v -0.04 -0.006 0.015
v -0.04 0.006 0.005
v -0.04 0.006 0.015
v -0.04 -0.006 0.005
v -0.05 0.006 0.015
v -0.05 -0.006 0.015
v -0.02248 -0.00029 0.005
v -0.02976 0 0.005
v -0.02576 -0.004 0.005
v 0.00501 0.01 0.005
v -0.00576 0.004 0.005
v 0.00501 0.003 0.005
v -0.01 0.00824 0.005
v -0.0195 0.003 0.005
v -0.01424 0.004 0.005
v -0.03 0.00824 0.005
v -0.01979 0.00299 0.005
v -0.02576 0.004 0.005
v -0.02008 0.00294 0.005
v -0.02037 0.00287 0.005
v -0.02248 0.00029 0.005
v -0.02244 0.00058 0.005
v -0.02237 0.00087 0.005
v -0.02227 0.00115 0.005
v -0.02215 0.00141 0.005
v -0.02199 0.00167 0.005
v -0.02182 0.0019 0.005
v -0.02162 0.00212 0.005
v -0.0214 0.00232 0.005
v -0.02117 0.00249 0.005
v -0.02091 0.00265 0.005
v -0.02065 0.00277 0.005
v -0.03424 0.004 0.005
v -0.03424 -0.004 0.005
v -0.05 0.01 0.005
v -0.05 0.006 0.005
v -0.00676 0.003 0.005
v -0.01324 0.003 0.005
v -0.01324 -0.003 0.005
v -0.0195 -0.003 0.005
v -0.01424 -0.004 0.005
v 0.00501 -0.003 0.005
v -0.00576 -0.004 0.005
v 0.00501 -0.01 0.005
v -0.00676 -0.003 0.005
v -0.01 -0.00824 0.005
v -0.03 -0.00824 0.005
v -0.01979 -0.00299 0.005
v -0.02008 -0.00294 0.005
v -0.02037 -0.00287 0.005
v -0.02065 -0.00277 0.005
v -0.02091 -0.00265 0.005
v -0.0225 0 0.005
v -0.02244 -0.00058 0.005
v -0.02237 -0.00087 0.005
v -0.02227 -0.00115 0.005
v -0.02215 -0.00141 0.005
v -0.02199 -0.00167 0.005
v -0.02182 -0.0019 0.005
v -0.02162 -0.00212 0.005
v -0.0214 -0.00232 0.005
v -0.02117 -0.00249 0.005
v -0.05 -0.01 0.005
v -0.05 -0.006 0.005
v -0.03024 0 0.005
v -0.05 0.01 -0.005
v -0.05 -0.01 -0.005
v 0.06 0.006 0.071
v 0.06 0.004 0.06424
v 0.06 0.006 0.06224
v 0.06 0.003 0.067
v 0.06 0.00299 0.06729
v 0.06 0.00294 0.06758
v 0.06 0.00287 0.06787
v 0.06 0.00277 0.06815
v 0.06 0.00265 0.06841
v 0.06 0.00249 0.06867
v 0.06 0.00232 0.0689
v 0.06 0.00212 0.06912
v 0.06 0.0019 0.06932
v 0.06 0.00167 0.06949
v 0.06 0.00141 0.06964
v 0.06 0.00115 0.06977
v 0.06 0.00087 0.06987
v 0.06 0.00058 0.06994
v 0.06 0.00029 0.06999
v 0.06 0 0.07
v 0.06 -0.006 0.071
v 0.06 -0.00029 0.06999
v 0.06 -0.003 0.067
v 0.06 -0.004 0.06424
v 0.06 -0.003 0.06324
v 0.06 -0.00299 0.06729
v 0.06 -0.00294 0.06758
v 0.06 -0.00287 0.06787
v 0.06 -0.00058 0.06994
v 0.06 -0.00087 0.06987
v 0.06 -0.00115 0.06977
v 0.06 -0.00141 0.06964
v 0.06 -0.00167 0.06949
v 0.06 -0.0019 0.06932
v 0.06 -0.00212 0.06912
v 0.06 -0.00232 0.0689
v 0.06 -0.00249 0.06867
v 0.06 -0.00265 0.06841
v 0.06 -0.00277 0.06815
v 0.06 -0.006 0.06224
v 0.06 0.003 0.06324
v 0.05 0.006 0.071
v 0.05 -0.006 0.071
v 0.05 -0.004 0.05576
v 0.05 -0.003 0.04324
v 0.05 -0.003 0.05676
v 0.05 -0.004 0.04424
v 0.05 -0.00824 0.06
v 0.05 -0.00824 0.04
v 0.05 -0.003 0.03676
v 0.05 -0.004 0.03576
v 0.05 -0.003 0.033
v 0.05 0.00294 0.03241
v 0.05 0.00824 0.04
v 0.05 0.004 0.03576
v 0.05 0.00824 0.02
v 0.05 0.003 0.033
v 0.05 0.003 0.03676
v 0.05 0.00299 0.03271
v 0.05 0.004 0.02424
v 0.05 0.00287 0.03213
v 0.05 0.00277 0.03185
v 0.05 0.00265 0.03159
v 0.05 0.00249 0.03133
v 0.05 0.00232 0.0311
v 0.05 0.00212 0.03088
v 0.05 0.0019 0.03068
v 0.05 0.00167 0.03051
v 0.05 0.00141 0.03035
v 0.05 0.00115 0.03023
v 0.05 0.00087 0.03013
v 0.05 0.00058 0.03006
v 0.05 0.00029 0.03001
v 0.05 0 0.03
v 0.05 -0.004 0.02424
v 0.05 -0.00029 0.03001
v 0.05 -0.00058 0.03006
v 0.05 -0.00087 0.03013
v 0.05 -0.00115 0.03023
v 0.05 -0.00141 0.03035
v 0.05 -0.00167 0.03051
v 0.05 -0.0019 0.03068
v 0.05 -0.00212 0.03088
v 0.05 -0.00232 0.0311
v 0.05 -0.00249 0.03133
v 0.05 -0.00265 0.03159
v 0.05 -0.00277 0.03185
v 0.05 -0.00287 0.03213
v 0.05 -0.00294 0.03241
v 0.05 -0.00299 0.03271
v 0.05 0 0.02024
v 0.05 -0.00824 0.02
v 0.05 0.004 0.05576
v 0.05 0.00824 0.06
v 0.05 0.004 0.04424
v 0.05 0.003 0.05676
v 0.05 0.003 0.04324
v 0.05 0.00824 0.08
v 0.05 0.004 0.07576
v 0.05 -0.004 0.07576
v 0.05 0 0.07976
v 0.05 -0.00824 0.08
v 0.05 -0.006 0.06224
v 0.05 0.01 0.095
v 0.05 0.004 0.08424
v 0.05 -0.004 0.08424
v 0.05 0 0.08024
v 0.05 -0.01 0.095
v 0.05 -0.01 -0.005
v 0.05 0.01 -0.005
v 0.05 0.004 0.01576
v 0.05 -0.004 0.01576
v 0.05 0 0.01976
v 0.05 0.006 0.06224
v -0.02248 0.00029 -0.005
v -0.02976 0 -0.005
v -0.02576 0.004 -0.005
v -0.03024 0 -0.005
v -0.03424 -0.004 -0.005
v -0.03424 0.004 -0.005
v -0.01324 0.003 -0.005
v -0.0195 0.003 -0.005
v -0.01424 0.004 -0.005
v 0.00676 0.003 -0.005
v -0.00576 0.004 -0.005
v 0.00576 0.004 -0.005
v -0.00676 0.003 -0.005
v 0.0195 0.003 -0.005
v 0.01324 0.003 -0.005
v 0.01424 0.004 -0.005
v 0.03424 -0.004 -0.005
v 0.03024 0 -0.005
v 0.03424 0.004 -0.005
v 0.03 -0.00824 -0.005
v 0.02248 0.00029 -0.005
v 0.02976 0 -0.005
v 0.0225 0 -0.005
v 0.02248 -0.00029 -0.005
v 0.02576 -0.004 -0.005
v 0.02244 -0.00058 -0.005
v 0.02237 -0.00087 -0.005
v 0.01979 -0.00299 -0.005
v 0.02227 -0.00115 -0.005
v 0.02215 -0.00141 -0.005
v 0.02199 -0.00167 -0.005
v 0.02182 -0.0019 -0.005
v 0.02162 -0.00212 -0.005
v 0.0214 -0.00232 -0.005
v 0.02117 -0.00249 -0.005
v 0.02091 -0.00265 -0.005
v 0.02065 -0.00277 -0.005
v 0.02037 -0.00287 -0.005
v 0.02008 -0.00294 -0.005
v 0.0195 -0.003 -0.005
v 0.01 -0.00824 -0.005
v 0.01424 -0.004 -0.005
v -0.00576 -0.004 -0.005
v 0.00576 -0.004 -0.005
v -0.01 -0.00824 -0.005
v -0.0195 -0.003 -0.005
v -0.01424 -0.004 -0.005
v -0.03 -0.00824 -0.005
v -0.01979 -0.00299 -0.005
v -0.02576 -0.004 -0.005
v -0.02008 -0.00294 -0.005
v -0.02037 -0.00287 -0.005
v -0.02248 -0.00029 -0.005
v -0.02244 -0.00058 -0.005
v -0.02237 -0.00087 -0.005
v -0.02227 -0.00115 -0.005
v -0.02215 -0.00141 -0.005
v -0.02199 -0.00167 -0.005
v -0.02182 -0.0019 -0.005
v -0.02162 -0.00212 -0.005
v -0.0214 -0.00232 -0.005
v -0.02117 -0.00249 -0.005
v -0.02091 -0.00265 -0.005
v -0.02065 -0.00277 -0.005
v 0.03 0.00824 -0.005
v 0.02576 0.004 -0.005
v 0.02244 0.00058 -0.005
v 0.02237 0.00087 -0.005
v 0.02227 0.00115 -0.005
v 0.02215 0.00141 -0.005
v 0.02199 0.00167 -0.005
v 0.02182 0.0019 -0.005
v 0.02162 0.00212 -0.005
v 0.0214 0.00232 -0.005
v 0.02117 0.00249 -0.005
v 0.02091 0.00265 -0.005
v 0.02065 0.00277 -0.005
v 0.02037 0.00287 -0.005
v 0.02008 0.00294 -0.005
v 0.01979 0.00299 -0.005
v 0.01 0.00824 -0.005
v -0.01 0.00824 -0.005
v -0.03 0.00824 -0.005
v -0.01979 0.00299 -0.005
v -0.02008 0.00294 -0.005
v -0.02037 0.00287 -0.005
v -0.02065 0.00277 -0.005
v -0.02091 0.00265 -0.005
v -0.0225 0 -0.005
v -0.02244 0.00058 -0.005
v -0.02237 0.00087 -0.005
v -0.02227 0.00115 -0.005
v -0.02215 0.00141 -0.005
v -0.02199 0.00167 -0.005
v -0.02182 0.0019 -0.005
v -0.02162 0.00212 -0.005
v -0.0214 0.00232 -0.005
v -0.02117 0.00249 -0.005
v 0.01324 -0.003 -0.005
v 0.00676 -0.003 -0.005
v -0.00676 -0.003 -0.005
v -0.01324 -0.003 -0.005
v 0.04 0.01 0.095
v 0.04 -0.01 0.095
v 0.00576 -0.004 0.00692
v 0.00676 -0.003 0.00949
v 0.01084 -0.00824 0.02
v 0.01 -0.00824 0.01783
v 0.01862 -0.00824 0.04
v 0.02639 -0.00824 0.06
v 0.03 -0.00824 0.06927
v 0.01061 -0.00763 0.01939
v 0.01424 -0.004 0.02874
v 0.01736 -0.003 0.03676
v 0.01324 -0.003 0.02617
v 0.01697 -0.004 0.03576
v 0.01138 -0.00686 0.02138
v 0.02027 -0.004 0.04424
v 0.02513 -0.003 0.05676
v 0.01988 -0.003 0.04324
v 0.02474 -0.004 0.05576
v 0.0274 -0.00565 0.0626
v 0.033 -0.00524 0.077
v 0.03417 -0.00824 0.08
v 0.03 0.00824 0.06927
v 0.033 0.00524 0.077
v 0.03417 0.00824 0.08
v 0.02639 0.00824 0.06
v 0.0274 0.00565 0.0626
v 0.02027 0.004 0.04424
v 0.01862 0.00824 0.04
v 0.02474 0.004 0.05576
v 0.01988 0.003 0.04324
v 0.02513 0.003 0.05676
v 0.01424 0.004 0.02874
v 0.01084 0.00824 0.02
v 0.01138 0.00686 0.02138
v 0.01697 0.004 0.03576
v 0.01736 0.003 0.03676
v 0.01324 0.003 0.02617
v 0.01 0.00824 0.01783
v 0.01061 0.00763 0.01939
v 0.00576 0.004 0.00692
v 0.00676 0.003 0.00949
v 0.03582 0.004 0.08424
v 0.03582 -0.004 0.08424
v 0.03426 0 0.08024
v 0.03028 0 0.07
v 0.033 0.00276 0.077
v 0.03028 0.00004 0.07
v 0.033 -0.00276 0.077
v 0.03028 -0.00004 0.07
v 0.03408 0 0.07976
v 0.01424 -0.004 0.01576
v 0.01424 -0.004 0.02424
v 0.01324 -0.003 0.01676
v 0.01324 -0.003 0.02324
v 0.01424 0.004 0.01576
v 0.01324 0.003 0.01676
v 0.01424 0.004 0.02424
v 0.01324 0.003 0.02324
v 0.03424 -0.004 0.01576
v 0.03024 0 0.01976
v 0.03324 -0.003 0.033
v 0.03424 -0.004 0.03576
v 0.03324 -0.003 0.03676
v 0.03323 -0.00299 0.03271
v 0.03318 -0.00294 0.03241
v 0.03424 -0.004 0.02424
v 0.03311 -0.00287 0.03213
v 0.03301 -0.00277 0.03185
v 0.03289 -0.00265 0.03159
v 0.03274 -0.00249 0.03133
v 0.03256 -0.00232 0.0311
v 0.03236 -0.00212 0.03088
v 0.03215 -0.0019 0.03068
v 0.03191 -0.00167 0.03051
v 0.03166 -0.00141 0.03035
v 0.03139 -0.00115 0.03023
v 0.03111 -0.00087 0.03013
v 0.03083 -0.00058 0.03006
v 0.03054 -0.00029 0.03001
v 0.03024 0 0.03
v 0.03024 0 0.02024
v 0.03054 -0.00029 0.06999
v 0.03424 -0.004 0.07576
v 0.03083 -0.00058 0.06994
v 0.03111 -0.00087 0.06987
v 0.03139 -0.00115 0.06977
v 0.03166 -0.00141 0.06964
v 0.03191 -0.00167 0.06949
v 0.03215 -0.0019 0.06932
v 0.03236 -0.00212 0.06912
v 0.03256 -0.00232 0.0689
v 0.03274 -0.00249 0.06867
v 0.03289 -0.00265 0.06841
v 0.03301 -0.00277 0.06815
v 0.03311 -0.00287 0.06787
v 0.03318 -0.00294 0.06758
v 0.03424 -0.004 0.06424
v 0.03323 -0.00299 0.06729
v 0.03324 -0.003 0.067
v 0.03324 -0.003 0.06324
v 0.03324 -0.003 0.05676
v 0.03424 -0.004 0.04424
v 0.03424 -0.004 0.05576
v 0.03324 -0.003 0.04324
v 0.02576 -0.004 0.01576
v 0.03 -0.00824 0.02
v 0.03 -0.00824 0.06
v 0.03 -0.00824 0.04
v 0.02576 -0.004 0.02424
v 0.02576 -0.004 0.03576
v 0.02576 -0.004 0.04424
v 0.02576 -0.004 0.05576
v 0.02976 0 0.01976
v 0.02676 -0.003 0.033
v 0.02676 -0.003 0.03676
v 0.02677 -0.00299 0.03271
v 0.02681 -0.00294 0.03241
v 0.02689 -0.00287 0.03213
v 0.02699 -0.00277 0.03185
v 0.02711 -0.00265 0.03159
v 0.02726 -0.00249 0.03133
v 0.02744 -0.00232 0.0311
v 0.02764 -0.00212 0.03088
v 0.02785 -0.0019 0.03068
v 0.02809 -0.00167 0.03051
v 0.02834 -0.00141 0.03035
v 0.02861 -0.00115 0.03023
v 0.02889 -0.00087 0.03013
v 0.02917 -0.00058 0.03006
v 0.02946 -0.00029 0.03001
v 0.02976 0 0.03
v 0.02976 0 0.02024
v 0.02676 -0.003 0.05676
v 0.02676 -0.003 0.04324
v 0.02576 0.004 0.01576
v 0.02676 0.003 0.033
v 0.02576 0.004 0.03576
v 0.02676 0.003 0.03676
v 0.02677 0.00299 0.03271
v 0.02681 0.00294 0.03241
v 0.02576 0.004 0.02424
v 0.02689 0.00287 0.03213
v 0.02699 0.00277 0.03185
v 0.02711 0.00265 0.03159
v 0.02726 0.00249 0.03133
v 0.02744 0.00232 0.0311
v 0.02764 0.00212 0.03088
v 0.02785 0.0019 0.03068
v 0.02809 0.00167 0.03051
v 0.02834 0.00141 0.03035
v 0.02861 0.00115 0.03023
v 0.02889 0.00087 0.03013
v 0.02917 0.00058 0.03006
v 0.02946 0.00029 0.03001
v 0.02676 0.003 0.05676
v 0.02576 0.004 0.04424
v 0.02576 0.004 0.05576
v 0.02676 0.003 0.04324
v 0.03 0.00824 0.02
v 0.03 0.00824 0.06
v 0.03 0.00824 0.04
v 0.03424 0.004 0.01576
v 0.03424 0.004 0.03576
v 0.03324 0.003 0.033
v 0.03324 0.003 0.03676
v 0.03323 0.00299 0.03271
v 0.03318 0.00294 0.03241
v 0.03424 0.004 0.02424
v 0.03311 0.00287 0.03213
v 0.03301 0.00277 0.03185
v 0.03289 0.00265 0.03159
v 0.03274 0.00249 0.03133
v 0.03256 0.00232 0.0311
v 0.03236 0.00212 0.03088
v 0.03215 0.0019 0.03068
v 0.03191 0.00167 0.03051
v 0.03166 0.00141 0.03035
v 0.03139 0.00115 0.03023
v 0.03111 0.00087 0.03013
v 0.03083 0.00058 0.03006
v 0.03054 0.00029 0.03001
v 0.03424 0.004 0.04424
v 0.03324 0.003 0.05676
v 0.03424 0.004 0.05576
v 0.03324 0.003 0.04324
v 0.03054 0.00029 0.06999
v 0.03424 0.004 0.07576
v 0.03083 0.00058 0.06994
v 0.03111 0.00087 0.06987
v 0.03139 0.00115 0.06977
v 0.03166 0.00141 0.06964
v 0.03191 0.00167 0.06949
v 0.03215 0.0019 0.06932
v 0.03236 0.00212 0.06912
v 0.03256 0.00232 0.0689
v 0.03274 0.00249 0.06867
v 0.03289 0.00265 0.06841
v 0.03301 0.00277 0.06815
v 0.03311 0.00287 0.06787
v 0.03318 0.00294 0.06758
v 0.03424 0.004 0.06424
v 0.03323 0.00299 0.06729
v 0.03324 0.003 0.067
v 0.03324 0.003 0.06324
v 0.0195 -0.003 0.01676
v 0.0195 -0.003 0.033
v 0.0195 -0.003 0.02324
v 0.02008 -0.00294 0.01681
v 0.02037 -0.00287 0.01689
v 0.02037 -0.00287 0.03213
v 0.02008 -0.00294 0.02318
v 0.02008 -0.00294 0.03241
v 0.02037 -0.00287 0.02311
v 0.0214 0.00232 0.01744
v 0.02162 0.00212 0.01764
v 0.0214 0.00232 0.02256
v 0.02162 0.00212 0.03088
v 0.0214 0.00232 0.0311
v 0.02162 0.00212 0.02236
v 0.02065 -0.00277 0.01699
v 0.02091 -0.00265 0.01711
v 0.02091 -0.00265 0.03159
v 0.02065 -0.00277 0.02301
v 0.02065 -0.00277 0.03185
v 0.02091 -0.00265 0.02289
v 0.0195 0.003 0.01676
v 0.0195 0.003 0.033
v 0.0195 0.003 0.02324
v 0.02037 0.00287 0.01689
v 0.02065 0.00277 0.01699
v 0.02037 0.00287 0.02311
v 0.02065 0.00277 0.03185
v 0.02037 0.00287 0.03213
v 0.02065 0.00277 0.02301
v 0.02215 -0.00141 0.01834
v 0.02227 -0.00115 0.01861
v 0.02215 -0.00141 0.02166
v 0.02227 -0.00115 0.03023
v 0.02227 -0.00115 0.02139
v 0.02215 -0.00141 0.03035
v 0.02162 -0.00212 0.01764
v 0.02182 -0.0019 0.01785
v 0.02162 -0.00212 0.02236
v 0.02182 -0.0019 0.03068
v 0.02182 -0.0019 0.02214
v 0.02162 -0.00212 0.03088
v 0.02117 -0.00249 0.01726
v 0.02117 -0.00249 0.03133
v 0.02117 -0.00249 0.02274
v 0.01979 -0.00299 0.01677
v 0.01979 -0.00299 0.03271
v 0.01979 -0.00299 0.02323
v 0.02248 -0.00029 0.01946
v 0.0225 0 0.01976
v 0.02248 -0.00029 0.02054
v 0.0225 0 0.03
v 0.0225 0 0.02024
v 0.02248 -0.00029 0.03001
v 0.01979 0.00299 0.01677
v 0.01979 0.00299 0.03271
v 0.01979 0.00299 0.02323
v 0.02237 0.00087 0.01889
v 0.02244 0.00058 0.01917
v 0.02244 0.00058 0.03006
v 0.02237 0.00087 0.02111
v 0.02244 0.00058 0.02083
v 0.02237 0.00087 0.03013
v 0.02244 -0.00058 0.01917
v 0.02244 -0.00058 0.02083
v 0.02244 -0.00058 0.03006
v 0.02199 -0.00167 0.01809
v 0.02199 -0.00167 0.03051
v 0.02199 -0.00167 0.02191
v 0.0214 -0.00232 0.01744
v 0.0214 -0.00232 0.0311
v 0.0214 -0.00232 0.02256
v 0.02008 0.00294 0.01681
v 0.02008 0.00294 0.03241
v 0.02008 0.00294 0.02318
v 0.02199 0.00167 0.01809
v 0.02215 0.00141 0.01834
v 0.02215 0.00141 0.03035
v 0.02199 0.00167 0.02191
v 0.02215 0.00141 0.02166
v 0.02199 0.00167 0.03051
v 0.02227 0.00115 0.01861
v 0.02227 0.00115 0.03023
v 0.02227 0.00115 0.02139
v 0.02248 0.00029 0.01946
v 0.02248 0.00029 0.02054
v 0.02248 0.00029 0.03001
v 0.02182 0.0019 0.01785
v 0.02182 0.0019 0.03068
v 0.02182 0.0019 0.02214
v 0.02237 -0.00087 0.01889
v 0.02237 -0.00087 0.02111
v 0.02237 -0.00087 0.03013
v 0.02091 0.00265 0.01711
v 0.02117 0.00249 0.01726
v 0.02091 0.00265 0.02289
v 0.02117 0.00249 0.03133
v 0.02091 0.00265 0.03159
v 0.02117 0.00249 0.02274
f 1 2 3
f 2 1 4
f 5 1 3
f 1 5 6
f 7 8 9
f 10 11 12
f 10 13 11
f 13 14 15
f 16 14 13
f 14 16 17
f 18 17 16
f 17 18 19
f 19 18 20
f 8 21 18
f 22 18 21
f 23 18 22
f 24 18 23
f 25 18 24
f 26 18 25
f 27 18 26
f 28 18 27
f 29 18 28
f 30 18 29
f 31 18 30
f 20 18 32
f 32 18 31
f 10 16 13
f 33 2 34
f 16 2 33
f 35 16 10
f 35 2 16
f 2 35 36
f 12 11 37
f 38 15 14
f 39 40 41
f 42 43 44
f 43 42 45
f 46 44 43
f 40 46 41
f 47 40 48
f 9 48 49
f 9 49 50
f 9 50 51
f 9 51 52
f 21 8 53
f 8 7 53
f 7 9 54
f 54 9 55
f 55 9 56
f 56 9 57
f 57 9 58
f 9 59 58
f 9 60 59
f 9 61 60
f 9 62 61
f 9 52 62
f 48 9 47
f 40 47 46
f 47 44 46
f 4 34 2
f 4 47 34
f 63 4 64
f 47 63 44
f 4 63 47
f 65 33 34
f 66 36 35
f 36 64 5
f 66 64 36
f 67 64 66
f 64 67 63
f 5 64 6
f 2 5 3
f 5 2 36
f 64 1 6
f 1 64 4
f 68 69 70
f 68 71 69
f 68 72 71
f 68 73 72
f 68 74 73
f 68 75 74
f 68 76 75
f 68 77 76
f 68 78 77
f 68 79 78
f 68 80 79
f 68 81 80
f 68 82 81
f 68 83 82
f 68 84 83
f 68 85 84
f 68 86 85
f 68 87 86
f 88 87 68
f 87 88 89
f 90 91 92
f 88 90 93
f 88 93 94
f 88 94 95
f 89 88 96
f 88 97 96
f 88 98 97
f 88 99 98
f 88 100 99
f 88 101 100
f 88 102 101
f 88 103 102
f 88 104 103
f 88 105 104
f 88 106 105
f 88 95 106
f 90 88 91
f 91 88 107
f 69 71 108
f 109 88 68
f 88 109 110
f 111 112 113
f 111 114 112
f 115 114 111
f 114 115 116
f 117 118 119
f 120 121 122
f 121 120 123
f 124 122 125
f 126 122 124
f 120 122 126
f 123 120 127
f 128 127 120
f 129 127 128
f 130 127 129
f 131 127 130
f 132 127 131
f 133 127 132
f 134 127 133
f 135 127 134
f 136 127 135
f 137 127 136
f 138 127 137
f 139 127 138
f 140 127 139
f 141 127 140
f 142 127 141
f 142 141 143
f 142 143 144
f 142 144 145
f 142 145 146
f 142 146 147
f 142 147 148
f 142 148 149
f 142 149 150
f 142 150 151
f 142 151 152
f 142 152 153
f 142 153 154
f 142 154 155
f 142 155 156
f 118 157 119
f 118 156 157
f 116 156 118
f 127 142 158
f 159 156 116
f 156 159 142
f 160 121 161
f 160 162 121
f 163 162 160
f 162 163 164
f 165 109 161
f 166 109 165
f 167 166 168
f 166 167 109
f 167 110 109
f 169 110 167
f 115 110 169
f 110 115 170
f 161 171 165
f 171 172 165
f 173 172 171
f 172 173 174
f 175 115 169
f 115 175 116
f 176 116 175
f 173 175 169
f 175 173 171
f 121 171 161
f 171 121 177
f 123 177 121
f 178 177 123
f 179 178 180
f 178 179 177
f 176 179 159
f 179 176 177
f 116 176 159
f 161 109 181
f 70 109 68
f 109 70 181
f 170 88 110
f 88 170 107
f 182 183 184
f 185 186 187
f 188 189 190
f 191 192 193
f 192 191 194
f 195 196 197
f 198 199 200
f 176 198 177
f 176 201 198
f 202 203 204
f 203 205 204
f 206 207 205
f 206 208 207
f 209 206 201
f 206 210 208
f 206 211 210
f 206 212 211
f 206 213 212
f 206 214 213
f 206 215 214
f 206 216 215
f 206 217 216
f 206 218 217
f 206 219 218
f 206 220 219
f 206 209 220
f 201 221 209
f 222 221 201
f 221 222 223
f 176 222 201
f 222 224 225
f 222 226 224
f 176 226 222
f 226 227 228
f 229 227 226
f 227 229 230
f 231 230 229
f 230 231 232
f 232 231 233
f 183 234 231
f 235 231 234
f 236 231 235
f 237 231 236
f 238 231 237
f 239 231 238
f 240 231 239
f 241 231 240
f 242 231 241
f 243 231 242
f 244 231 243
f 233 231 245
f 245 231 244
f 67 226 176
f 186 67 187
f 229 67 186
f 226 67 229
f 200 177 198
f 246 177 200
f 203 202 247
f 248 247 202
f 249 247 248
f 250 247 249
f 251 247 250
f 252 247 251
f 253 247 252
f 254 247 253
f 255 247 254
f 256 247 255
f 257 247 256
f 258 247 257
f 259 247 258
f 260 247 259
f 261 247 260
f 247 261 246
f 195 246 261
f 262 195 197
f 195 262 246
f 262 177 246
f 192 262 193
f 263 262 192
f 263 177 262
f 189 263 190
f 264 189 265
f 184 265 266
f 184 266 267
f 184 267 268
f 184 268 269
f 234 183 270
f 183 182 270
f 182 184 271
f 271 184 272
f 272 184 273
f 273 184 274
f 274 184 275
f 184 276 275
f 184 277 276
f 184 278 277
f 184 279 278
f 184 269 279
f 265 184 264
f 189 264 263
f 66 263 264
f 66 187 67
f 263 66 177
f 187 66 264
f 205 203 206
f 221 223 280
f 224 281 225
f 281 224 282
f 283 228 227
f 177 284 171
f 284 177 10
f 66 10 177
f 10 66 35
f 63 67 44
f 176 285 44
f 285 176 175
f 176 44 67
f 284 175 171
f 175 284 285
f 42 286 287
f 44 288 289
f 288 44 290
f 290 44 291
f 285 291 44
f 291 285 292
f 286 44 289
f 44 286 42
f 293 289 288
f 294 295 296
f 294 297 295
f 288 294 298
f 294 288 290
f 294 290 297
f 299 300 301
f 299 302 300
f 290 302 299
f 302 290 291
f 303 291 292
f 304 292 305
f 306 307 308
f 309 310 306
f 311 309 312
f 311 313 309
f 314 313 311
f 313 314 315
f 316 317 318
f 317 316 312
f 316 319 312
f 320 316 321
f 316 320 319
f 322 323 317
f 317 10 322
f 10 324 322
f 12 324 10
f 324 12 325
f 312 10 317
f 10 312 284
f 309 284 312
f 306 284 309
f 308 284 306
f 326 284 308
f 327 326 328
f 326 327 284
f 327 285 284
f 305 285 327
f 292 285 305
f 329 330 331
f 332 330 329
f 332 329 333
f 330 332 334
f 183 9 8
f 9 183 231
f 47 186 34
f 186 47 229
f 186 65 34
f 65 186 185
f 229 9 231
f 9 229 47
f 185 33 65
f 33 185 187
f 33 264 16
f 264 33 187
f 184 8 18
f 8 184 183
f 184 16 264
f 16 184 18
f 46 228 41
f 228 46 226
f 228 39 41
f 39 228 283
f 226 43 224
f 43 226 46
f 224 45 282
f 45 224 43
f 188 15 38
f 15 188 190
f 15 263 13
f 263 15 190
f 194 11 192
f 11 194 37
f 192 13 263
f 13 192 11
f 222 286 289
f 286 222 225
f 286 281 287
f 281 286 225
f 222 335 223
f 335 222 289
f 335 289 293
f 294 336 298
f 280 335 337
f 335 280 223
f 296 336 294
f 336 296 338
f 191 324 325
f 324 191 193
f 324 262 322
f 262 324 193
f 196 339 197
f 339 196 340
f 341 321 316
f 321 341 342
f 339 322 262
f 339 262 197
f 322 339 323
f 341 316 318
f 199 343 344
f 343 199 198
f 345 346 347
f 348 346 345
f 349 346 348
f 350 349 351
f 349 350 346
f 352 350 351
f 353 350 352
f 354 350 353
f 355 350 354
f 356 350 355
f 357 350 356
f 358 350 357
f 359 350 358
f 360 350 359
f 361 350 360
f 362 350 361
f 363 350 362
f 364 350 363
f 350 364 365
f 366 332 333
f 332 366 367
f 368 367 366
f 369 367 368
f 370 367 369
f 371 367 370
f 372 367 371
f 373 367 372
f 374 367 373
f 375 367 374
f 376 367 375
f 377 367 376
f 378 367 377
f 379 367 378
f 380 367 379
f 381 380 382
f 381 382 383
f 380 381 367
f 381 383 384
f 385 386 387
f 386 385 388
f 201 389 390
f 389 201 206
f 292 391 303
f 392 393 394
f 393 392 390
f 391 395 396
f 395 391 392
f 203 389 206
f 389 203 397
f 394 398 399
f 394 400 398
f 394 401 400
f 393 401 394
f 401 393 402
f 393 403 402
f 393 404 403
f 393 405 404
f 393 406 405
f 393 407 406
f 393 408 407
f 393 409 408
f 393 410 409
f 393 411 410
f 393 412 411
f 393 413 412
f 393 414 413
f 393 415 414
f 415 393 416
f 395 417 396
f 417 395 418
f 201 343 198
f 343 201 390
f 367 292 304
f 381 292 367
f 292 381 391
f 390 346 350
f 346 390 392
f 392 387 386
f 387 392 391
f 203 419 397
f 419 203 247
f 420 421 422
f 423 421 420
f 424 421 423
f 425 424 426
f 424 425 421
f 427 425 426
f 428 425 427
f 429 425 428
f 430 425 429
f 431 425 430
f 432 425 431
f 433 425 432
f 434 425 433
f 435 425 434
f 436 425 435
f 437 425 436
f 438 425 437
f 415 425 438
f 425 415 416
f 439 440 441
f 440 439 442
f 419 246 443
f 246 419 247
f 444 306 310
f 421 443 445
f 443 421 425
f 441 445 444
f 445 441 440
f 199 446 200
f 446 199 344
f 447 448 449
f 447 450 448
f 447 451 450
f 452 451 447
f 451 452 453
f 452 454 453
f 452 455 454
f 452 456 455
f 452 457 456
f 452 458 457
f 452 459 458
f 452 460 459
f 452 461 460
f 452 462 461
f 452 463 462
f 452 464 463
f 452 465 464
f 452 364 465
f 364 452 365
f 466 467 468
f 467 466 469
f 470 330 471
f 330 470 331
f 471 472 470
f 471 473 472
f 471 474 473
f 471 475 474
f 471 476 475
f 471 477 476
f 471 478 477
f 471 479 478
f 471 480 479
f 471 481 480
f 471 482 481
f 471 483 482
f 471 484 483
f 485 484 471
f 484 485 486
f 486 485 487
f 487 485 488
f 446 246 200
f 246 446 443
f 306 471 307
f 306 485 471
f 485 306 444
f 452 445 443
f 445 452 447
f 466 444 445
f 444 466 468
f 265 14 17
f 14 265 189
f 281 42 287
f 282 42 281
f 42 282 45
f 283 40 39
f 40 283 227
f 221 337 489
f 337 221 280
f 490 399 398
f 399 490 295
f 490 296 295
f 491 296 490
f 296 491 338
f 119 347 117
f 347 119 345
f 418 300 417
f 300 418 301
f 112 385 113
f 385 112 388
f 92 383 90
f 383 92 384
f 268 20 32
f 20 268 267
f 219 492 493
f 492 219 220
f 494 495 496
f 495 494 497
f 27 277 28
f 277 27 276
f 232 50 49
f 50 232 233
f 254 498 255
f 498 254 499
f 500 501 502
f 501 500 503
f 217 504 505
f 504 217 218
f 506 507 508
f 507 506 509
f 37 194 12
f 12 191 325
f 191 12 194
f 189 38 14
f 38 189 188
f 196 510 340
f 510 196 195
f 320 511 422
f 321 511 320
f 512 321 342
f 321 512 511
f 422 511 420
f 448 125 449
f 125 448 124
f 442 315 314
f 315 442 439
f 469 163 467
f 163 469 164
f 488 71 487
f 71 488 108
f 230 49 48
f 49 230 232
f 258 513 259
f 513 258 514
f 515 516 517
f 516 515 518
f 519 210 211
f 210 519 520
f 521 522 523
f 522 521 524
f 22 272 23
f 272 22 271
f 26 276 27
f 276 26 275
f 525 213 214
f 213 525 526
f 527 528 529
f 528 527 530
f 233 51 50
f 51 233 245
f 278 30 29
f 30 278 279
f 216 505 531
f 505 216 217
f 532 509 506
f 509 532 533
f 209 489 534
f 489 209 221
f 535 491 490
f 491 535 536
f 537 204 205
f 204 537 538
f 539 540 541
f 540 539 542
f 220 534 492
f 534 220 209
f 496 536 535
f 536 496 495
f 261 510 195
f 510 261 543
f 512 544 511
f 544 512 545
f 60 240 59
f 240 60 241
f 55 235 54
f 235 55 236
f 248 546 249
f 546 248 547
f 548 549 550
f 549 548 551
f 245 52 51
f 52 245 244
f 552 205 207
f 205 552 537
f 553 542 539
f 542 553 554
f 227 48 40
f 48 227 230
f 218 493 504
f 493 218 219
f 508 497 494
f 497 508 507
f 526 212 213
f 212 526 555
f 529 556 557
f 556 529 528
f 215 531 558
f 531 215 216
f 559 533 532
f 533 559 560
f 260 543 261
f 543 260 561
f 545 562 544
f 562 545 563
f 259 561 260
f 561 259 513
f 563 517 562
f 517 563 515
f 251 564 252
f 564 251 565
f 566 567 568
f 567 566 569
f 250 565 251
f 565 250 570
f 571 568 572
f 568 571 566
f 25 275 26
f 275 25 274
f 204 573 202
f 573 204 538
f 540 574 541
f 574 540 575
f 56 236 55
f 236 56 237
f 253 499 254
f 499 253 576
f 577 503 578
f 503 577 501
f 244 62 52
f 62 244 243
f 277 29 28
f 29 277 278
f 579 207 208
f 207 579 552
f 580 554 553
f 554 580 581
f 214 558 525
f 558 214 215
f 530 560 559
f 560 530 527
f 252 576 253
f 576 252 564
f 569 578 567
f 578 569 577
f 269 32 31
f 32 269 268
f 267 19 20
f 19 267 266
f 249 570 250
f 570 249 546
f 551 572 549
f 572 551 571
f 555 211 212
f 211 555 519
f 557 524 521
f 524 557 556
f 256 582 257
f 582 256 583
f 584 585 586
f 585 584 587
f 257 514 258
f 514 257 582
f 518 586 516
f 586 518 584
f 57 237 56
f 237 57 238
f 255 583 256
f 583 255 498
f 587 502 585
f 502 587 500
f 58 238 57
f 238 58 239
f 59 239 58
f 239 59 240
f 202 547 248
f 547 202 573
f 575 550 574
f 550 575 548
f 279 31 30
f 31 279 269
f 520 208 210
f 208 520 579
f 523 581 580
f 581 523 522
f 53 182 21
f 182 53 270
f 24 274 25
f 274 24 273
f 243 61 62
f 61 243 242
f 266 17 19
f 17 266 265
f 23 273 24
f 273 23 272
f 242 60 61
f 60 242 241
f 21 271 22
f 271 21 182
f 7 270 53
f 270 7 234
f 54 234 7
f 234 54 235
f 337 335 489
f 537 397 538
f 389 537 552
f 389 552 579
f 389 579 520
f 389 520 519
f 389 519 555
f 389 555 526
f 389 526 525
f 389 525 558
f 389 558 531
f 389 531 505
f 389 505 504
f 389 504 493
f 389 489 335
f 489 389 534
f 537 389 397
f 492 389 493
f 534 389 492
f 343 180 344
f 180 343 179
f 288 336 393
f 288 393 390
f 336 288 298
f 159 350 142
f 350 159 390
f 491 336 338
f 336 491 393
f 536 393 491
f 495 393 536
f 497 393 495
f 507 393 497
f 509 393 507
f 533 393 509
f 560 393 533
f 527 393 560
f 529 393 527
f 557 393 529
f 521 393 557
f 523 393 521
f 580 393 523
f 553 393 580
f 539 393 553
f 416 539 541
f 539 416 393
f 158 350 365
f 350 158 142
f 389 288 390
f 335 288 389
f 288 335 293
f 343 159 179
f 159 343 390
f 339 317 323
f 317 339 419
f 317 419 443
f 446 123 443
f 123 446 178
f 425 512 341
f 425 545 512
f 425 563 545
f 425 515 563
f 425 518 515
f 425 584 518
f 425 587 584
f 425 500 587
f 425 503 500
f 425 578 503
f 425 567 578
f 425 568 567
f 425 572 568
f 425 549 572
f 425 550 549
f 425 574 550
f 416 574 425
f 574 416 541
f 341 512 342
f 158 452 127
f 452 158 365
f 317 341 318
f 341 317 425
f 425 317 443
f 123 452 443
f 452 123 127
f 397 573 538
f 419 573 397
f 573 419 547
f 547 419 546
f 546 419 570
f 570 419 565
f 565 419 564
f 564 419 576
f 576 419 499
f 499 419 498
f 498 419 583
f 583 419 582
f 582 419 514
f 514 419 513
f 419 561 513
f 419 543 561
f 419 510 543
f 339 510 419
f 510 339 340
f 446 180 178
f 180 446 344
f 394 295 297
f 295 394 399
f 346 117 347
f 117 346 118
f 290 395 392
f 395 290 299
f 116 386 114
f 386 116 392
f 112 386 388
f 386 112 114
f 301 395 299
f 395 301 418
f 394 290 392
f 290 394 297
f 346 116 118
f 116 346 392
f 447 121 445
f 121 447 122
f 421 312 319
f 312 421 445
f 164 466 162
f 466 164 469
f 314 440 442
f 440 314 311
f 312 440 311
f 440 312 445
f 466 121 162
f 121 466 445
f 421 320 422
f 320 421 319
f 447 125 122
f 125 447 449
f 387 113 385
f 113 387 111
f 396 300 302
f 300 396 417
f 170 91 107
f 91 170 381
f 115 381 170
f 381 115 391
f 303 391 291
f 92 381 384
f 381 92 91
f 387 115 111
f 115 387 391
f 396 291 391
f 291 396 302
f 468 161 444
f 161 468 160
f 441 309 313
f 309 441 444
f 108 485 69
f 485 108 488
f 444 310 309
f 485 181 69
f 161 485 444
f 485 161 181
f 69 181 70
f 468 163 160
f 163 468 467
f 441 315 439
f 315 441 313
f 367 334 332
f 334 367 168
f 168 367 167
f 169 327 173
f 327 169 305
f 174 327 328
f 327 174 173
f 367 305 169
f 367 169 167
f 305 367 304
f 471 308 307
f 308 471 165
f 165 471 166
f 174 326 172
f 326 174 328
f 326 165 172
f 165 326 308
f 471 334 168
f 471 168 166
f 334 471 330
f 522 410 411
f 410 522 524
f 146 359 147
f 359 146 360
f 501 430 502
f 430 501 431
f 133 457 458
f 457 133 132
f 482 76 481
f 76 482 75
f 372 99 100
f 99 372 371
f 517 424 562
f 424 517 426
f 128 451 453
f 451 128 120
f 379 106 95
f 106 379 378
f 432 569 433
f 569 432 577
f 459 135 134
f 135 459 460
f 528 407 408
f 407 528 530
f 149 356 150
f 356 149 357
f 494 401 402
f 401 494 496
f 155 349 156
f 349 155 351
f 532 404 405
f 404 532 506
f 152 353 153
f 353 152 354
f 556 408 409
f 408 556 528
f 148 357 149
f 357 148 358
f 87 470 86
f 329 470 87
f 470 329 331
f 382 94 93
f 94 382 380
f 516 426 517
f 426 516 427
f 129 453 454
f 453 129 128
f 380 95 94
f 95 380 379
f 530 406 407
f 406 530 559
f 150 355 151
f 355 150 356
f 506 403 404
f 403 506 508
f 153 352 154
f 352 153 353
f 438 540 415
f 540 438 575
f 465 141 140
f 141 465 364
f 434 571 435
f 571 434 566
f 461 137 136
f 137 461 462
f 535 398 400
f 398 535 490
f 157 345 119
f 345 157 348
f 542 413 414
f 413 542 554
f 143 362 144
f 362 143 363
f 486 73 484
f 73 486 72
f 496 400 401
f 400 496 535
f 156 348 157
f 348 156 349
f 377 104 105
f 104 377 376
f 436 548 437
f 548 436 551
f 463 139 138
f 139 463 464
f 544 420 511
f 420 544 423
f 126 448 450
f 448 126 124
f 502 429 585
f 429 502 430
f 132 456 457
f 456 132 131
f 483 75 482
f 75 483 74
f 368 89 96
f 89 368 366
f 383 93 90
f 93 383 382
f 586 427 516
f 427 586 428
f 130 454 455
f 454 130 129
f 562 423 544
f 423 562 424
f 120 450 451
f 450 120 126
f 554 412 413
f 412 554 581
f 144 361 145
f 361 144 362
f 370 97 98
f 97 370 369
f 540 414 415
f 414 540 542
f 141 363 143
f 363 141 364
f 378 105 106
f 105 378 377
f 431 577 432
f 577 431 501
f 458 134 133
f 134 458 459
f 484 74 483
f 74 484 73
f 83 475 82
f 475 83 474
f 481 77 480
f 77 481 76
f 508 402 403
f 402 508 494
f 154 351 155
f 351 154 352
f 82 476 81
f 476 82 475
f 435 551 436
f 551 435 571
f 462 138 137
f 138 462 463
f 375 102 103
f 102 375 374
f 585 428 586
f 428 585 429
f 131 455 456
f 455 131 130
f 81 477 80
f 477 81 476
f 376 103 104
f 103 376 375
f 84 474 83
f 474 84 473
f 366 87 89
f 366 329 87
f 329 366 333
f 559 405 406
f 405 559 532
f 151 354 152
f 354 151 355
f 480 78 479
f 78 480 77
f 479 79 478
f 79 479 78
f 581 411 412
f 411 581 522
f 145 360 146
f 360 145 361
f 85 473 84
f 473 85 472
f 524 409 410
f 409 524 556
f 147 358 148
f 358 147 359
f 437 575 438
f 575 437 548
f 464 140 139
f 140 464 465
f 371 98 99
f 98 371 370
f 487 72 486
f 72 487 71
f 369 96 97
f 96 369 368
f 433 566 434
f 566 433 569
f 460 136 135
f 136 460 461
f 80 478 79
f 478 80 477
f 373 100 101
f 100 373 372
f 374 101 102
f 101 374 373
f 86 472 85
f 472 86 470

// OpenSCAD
$fn=64;

eps = 0.01;

// Bounding box target: 0.1 x 0.0 x 0.1 mm (use 0.1 x 0.02 x 0.1 mm to avoid zero thickness)
L = 0.10;   // length (elongated axis)
W = 0.02;   // width (non-zero)
T = 0.01;   // thickness
H = 0.10;   // upright height

module diamond_hole(size=0.006, thickness=0.2) {
    rotate([0,0,45]) cube([size, size, thickness], center=true);
}

module slot_hole(len=0.030, wid=0.006, thickness=0.2) {
    hull() {
        translate([-len/2 + wid/2, 0, 0]) cylinder(h=thickness, r=wid/2, center=true);
        translate([ len/2 - wid/2, 0, 0]) cylinder(h=thickness, r=wid/2, center=true);
    }
}

module base_plate() {
    cube([L, W, T], center=true);
}

module upright_plate() {
    translate([L/2 - T/2, 0, H/2 - T/2])
        cube([T, W, H], center=true);
}

module gusset() {
    // Triangular gusset in X-Z plane, extruded along Y
    translate([L/2 - T, 0, T/2])
        rotate([90,0,0])
            linear_extrude(height=W, center=true)
                polygon(points=[
                    [0, 0],
                    [0, H - T],
                    [-(L*0.35), 0]
                ]);
}

module tabs_steps() {
    // Small tabs/steps along edges
    tab_t = T;
    tab_w = W*0.6;
    tab_l = L*0.10;

    // Two tabs on base top surface near ends
    translate([-L/2 + tab_l/2, 0, T/2 + tab_t/2])
        cube([tab_l, tab_w, tab_t], center=true);
    translate([ L/2 - tab_l*1.6, 0, T/2 + tab_t/2])
        cube([tab_l*0.8, tab_w, tab_t], center=true);

    // Small step on upright outer face
    translate([L/2 + tab_t/2, 0, H*0.65])
        cube([tab_t, tab_w, H*0.12], center=true);
}

module base_holes() {
    // Diamond holes pattern on base
    for (x = [-L*0.30, -L*0.10, L*0.10, L*0.30])
        for (y = [-W*0.20, W*0.20])
            translate([x, y, 0])
                diamond_hole(size=0.006, thickness=0.3);

    // Rectangular slot on base
    translate([0, 0, 0])
        slot_hole(len=L*0.45, wid=0.006, thickness=0.3);
}

module upright_holes() {
    // Diamond holes pattern on upright (in X-Z plane, through X)
    for (z = [H*0.25, H*0.45, H*0.65, H*0.85])
        for (y = [-W*0.20, W*0.20])
            translate([L/2 - T/2, y, z - T/2])
                rotate([0,90,0])
                    diamond_hole(size=0.006, thickness=0.3);

    // Rectangular slot on upright (vertical slot), through X
    translate([L/2 - T/2, 0, H*0.55 - T/2])
        rotate([0,90,0])
            slot_hole(len=H*0.40, wid=0.006, thickness=0.3);
}

difference() {
    union() {
        base_plate();
        upright_plate();
        gusset();
        tabs_steps();
    }
    base_holes();
    upright_holes();
}
